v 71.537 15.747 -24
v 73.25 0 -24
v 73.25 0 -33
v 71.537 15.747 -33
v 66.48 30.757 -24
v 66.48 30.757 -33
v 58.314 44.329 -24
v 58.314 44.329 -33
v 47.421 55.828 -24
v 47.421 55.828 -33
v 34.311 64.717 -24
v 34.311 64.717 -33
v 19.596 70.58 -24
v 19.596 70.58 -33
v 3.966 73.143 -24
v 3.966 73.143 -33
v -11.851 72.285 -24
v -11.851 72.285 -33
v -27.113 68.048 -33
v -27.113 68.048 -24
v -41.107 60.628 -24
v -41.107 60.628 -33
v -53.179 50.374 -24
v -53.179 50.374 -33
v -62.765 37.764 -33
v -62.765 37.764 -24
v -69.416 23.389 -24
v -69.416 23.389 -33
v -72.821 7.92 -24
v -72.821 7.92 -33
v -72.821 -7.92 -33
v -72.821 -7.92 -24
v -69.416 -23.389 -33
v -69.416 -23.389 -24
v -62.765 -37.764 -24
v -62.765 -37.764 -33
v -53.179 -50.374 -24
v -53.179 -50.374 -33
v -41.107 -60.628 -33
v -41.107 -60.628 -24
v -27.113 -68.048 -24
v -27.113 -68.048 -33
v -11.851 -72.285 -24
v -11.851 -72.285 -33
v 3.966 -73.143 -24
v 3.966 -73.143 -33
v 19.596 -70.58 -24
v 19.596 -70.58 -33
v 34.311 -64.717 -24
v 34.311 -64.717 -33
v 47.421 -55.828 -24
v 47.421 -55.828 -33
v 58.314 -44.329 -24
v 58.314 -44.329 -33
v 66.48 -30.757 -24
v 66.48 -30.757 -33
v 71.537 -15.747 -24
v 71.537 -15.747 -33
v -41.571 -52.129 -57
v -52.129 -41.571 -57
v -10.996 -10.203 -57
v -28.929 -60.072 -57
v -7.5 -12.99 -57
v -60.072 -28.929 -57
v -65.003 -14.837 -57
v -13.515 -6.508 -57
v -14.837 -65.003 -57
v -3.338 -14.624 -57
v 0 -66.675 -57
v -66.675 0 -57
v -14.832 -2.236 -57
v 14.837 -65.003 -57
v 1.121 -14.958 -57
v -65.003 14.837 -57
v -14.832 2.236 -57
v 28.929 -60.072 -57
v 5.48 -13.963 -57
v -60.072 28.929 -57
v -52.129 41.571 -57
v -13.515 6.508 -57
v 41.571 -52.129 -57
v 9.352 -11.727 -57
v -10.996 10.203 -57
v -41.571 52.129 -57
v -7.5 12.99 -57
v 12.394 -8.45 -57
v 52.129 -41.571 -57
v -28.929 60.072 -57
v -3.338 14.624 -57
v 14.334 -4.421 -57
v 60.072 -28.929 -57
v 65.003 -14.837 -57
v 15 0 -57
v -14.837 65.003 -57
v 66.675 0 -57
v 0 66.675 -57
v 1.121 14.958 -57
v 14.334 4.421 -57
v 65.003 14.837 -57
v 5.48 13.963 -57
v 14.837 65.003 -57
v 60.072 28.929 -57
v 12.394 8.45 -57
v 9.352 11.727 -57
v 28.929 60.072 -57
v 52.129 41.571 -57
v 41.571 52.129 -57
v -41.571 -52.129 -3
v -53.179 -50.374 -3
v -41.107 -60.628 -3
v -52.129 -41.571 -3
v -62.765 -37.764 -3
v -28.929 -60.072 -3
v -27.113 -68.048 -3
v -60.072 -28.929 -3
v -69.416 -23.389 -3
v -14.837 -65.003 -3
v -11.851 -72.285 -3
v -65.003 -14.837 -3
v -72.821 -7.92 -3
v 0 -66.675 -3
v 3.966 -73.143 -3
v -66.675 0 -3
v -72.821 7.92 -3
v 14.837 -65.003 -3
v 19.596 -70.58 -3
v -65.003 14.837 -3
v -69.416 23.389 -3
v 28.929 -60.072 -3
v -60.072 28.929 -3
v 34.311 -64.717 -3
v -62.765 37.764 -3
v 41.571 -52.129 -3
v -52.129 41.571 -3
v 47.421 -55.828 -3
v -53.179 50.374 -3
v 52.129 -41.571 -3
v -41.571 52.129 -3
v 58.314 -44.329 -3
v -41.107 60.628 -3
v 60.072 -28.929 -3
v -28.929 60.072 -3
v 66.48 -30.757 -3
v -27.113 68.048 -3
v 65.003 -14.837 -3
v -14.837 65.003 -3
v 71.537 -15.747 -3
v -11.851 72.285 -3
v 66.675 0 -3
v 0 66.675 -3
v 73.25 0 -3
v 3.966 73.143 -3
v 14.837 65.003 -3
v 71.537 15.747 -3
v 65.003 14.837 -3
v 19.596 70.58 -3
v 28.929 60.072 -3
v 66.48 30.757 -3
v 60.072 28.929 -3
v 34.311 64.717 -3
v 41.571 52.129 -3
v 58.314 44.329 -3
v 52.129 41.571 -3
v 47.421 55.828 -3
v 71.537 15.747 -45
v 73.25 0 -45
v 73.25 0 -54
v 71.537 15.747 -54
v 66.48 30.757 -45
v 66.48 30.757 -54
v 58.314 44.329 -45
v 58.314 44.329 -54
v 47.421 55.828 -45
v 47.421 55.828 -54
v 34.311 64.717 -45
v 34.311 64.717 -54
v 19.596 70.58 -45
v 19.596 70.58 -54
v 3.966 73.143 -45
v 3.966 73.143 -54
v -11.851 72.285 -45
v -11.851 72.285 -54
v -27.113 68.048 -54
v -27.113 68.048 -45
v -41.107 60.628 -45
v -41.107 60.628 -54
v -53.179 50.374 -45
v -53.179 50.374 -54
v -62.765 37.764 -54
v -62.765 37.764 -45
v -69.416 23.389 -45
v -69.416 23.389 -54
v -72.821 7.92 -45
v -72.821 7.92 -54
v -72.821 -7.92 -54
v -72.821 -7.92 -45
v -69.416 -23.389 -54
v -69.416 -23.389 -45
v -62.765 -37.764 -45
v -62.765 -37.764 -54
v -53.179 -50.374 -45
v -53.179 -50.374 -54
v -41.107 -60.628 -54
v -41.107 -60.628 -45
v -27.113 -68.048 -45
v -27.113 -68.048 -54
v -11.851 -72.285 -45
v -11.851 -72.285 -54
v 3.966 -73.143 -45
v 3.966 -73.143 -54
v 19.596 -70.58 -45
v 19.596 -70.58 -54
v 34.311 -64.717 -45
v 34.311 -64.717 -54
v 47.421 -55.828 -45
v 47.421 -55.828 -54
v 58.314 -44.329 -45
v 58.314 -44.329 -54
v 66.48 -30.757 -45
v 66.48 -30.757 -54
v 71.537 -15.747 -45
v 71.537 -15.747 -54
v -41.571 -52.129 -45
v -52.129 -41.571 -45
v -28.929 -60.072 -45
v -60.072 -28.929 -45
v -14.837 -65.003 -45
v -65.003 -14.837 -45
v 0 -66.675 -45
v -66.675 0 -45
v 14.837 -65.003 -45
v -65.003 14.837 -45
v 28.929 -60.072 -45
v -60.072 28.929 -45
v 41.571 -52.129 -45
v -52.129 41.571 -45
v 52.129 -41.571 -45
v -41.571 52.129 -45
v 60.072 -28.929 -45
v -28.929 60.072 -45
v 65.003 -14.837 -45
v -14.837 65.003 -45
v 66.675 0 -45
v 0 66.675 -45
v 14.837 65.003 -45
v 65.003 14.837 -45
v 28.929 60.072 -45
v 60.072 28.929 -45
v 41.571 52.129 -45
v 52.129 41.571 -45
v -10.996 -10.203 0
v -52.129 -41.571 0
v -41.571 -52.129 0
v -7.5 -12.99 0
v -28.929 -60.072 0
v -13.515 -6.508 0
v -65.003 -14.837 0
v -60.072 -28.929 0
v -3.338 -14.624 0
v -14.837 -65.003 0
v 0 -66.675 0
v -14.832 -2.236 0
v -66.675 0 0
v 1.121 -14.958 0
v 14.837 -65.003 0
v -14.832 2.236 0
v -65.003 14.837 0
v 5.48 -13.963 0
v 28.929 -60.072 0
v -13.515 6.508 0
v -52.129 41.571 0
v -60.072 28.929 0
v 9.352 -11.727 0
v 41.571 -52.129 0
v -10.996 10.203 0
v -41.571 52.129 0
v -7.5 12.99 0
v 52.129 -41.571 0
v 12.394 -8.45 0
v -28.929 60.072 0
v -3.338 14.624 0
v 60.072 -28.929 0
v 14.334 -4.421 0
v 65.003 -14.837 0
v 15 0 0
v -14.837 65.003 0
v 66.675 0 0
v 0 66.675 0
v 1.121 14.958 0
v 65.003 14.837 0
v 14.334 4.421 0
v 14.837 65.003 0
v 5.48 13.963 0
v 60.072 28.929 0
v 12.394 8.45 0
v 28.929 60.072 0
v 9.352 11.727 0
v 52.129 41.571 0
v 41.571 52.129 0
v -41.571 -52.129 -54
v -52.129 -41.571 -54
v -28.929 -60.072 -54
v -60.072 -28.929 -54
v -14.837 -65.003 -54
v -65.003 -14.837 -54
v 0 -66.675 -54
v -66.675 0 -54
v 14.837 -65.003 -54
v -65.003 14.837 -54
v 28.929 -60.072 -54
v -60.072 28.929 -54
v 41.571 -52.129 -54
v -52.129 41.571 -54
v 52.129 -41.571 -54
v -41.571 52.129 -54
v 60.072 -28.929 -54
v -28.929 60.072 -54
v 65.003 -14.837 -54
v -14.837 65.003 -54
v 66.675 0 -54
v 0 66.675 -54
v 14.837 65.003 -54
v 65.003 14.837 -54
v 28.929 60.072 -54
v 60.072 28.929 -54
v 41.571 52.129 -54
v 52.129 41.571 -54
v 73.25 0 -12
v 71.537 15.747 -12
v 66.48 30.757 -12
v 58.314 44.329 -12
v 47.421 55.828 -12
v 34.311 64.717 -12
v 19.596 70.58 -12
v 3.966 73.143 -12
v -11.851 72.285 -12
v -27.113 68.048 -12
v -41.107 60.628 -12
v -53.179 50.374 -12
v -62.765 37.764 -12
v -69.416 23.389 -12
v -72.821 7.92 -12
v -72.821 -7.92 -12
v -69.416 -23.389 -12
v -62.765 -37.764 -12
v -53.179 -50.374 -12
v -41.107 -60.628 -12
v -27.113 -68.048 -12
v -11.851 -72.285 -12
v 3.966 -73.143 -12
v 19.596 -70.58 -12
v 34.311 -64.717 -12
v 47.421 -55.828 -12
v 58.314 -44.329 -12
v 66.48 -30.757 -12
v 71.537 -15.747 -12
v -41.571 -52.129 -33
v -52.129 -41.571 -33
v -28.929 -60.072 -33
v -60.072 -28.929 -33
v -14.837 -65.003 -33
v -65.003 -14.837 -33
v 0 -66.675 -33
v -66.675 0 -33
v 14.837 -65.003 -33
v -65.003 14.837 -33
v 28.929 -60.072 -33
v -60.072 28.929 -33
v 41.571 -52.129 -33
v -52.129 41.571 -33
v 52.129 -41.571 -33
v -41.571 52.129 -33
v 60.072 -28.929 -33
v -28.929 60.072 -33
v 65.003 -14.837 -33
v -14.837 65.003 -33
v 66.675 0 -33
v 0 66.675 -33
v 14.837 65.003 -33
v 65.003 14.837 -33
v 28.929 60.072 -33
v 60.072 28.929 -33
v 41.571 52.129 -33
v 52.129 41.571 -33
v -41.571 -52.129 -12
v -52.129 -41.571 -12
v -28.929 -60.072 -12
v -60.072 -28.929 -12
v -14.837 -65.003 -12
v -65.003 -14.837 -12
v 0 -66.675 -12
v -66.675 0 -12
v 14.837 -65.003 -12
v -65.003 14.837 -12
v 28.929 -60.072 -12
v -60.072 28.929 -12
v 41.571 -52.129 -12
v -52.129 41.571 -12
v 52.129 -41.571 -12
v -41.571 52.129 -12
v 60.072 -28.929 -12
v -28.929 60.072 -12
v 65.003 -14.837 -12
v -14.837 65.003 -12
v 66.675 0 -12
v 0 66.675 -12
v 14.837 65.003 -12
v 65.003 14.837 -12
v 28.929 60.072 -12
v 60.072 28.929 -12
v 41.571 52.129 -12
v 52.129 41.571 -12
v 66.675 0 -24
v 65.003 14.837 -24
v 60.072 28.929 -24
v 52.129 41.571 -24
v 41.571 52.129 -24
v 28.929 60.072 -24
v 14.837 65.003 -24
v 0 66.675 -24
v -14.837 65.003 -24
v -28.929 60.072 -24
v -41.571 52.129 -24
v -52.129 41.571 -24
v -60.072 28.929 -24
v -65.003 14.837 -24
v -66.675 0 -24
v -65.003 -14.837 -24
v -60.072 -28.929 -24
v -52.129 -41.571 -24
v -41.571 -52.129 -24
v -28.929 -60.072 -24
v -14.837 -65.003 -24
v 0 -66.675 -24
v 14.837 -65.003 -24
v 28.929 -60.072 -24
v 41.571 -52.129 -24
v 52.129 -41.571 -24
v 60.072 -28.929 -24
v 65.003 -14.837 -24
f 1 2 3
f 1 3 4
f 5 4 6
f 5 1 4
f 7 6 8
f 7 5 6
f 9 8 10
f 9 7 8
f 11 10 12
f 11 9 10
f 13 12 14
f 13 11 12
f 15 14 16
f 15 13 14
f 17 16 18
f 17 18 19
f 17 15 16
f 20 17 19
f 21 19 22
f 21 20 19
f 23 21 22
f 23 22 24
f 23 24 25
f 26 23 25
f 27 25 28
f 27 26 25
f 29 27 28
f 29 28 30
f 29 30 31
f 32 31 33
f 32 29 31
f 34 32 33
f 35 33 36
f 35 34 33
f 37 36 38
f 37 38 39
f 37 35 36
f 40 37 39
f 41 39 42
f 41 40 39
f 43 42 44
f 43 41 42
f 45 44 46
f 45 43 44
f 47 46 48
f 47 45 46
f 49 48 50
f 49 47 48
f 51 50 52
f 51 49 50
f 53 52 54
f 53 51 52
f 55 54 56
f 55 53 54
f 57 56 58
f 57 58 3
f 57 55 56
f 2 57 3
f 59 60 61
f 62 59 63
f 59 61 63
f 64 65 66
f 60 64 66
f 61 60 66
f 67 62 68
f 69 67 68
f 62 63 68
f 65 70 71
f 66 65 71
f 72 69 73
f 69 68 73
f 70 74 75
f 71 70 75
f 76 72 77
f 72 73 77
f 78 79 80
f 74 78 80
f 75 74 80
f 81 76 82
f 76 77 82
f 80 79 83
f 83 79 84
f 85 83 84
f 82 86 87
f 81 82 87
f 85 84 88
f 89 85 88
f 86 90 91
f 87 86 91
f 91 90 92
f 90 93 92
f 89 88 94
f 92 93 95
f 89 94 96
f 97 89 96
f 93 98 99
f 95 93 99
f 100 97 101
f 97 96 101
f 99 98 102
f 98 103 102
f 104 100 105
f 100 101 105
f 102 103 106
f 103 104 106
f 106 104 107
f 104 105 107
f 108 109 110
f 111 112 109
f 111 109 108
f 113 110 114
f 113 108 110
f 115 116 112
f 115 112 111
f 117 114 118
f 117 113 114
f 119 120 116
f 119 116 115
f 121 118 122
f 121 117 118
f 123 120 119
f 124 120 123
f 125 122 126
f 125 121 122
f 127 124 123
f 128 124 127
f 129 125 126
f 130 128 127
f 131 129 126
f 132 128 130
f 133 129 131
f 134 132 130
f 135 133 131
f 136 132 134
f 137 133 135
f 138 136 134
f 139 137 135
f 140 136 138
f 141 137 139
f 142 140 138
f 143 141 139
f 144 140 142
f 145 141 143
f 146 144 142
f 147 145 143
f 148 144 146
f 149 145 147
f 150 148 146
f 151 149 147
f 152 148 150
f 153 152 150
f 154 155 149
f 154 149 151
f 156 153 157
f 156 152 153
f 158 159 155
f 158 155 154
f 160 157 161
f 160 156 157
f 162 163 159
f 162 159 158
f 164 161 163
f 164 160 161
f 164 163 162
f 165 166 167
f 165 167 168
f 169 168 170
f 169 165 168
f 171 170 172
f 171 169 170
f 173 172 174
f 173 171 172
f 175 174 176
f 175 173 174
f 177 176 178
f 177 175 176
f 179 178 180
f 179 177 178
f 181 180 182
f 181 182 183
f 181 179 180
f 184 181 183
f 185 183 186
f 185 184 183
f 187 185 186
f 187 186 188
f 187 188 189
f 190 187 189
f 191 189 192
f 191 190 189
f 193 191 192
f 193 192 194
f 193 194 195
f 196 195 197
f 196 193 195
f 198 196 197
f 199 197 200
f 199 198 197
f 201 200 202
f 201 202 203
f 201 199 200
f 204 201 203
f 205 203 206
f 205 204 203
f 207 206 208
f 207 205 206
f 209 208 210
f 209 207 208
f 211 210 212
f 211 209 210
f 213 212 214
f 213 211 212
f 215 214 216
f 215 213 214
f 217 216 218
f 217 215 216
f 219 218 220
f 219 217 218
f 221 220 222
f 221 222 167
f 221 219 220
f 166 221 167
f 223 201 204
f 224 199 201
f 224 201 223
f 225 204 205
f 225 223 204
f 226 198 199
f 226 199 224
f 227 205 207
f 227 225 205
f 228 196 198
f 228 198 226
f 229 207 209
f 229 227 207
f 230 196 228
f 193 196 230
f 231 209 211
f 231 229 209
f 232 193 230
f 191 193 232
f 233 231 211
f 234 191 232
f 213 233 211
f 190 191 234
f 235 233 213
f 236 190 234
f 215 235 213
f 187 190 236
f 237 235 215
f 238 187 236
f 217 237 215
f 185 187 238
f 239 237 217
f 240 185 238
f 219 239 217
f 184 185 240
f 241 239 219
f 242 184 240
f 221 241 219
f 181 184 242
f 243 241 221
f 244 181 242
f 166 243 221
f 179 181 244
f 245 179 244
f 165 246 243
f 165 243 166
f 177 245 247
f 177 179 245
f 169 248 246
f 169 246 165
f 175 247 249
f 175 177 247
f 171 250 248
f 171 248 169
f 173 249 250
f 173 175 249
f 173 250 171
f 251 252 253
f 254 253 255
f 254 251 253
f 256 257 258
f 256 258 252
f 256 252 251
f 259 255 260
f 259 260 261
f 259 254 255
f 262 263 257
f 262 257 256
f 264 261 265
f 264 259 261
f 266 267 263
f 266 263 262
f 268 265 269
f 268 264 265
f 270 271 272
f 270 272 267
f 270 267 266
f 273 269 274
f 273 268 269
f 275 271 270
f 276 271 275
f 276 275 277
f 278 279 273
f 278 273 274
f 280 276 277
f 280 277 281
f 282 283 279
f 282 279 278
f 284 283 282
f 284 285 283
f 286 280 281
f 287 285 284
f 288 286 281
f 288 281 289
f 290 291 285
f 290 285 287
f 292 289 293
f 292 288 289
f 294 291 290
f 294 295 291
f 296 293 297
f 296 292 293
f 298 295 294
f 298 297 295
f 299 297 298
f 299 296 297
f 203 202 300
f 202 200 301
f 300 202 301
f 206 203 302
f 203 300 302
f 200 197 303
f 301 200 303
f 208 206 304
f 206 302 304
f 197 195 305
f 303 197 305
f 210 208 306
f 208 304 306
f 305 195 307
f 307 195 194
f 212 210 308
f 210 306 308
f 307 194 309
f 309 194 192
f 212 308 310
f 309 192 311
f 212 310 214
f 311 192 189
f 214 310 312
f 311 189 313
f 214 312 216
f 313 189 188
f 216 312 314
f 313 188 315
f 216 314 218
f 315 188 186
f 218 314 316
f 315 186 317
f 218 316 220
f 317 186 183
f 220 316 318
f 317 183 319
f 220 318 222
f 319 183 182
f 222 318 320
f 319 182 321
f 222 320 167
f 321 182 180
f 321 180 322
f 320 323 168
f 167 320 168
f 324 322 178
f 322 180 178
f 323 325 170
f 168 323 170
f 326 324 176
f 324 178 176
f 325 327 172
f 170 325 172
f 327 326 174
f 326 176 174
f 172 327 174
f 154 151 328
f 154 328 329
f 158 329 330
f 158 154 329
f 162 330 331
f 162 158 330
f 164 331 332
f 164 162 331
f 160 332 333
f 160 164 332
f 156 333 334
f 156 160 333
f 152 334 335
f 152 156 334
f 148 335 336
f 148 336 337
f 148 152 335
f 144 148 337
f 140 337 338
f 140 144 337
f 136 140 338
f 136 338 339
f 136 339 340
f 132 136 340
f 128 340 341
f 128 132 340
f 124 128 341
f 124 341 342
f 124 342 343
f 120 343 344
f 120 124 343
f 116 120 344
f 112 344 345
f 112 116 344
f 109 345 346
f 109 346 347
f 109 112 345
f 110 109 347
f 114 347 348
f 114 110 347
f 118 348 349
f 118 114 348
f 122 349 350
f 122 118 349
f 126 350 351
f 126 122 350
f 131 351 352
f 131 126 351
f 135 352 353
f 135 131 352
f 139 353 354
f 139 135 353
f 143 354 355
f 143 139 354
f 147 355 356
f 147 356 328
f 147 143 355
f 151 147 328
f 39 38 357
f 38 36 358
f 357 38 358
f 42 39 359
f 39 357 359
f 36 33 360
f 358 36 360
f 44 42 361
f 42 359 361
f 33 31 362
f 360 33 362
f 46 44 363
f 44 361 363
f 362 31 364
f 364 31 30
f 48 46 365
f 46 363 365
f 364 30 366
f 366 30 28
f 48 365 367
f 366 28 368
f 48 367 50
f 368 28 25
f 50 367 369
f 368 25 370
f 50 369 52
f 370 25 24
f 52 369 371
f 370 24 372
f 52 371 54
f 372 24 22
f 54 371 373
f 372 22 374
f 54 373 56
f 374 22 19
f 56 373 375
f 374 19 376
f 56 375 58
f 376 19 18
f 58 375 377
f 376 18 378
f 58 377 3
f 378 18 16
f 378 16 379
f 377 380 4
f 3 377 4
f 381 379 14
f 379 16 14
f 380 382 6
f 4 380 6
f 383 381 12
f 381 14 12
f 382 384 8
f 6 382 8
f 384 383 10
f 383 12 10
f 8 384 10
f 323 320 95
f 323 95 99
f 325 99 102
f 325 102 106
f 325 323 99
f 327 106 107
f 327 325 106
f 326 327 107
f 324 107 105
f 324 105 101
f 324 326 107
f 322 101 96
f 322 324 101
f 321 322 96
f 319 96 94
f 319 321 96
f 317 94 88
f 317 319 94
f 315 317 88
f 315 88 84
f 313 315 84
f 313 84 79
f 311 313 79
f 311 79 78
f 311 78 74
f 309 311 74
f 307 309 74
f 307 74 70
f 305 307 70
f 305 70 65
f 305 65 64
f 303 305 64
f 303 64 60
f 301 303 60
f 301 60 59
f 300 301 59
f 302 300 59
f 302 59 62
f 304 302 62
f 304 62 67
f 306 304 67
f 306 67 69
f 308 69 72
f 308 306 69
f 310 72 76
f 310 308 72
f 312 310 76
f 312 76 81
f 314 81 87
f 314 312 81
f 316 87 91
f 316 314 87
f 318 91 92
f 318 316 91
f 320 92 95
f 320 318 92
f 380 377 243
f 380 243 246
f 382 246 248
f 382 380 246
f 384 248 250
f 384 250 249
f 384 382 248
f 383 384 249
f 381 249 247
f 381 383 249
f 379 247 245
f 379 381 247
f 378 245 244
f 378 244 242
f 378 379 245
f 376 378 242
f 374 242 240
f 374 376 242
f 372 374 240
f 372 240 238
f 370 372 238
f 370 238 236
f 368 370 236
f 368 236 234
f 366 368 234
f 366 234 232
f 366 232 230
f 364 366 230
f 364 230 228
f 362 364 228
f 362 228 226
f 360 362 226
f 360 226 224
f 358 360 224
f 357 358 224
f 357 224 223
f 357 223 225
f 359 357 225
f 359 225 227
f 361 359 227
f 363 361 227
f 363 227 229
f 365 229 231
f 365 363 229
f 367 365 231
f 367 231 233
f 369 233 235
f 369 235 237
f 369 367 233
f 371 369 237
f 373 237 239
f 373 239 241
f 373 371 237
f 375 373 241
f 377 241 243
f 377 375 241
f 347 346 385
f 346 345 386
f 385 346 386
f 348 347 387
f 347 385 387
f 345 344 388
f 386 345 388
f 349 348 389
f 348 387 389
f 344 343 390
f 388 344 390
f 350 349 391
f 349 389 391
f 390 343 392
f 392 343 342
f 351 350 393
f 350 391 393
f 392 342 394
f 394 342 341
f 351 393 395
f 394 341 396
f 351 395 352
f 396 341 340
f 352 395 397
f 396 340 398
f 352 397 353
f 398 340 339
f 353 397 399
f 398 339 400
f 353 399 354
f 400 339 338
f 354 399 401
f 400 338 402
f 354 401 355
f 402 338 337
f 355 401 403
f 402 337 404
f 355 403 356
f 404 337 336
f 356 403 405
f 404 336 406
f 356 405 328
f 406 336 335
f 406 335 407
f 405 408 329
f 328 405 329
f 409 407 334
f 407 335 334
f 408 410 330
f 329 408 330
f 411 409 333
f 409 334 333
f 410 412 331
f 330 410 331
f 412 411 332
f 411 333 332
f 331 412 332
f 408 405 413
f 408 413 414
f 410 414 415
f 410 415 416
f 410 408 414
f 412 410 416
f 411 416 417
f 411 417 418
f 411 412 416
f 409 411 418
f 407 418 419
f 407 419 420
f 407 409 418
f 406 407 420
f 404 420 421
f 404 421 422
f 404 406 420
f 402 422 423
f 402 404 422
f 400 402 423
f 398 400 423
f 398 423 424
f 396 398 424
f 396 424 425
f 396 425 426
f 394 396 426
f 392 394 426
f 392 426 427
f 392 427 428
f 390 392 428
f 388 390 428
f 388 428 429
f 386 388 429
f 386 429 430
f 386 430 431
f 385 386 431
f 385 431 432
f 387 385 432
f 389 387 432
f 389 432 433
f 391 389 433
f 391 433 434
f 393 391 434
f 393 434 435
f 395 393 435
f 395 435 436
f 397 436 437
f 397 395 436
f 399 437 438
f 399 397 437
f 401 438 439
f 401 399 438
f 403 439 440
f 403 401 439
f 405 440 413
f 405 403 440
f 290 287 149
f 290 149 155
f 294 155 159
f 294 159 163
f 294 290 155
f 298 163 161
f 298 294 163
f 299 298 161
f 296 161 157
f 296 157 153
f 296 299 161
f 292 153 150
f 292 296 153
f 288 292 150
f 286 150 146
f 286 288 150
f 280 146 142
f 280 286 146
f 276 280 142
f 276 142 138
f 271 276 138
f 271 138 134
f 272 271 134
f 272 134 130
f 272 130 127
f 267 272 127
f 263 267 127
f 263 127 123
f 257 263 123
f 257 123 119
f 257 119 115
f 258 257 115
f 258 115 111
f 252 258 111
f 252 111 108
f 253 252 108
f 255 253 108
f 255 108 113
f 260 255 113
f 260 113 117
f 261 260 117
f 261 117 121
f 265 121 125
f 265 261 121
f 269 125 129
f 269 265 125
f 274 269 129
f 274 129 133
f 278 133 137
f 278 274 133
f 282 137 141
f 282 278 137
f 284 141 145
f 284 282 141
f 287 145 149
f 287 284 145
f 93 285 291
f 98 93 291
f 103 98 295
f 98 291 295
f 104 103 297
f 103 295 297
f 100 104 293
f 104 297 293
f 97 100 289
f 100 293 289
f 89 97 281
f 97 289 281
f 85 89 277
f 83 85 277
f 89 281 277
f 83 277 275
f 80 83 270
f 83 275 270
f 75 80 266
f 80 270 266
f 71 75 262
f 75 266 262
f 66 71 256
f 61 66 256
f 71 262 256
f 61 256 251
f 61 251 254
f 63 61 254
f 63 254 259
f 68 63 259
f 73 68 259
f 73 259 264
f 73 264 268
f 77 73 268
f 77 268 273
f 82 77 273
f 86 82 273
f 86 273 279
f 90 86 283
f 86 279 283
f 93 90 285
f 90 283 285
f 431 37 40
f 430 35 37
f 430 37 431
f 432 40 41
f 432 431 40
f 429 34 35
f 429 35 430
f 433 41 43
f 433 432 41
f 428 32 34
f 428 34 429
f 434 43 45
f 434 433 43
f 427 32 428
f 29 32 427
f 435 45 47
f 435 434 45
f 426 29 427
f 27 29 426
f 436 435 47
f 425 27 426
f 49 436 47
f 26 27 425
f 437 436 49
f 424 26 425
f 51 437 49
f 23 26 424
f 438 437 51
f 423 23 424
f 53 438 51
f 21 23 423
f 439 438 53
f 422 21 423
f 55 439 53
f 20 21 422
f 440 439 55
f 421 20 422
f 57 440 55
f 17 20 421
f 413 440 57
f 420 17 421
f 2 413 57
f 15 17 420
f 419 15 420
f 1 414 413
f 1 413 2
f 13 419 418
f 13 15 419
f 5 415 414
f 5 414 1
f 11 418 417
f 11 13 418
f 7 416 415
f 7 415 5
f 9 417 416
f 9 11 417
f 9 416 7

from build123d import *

# Parameters (mm, degrees)
SKETCH1_R           = 66.675
SKETCH1_R_2         = 15
BOSS_EXTRUDE1_DEPTH = 57
SKETCH2_R           = 73.25
SKETCH2_R_2         = 66.675
BOSS_EXTRUDE2_DEPTH = 9
LPATTERN1_COUNT     = 3
LPATTERN1_PITCH     = 21


with BuildPart() as part:
    # Sketch1 → Boss-Extrude1 (new body)
    with BuildSketch(Plane.XY):
        Circle(SKETCH1_R)
        Circle(SKETCH1_R_2, mode=Mode.SUBTRACT)
    extrude(amount=-BOSS_EXTRUDE1_DEPTH)

    # Sketch2 → Boss-Extrude2 (add)
    with BuildSketch(Plane.XY.offset(-3)):
        Circle(SKETCH2_R)
        Circle(SKETCH2_R_2, mode=Mode.SUBTRACT)
    boss_extrude2 = extrude(amount=-BOSS_EXTRUDE2_DEPTH)

    # LPattern1: Boss-Extrude2 ×3
    with Locations(*[(0, 0, -i * LPATTERN1_PITCH) for i in range(1, LPATTERN1_COUNT)]):
        add(boss_extrude2)


solid = part.part
